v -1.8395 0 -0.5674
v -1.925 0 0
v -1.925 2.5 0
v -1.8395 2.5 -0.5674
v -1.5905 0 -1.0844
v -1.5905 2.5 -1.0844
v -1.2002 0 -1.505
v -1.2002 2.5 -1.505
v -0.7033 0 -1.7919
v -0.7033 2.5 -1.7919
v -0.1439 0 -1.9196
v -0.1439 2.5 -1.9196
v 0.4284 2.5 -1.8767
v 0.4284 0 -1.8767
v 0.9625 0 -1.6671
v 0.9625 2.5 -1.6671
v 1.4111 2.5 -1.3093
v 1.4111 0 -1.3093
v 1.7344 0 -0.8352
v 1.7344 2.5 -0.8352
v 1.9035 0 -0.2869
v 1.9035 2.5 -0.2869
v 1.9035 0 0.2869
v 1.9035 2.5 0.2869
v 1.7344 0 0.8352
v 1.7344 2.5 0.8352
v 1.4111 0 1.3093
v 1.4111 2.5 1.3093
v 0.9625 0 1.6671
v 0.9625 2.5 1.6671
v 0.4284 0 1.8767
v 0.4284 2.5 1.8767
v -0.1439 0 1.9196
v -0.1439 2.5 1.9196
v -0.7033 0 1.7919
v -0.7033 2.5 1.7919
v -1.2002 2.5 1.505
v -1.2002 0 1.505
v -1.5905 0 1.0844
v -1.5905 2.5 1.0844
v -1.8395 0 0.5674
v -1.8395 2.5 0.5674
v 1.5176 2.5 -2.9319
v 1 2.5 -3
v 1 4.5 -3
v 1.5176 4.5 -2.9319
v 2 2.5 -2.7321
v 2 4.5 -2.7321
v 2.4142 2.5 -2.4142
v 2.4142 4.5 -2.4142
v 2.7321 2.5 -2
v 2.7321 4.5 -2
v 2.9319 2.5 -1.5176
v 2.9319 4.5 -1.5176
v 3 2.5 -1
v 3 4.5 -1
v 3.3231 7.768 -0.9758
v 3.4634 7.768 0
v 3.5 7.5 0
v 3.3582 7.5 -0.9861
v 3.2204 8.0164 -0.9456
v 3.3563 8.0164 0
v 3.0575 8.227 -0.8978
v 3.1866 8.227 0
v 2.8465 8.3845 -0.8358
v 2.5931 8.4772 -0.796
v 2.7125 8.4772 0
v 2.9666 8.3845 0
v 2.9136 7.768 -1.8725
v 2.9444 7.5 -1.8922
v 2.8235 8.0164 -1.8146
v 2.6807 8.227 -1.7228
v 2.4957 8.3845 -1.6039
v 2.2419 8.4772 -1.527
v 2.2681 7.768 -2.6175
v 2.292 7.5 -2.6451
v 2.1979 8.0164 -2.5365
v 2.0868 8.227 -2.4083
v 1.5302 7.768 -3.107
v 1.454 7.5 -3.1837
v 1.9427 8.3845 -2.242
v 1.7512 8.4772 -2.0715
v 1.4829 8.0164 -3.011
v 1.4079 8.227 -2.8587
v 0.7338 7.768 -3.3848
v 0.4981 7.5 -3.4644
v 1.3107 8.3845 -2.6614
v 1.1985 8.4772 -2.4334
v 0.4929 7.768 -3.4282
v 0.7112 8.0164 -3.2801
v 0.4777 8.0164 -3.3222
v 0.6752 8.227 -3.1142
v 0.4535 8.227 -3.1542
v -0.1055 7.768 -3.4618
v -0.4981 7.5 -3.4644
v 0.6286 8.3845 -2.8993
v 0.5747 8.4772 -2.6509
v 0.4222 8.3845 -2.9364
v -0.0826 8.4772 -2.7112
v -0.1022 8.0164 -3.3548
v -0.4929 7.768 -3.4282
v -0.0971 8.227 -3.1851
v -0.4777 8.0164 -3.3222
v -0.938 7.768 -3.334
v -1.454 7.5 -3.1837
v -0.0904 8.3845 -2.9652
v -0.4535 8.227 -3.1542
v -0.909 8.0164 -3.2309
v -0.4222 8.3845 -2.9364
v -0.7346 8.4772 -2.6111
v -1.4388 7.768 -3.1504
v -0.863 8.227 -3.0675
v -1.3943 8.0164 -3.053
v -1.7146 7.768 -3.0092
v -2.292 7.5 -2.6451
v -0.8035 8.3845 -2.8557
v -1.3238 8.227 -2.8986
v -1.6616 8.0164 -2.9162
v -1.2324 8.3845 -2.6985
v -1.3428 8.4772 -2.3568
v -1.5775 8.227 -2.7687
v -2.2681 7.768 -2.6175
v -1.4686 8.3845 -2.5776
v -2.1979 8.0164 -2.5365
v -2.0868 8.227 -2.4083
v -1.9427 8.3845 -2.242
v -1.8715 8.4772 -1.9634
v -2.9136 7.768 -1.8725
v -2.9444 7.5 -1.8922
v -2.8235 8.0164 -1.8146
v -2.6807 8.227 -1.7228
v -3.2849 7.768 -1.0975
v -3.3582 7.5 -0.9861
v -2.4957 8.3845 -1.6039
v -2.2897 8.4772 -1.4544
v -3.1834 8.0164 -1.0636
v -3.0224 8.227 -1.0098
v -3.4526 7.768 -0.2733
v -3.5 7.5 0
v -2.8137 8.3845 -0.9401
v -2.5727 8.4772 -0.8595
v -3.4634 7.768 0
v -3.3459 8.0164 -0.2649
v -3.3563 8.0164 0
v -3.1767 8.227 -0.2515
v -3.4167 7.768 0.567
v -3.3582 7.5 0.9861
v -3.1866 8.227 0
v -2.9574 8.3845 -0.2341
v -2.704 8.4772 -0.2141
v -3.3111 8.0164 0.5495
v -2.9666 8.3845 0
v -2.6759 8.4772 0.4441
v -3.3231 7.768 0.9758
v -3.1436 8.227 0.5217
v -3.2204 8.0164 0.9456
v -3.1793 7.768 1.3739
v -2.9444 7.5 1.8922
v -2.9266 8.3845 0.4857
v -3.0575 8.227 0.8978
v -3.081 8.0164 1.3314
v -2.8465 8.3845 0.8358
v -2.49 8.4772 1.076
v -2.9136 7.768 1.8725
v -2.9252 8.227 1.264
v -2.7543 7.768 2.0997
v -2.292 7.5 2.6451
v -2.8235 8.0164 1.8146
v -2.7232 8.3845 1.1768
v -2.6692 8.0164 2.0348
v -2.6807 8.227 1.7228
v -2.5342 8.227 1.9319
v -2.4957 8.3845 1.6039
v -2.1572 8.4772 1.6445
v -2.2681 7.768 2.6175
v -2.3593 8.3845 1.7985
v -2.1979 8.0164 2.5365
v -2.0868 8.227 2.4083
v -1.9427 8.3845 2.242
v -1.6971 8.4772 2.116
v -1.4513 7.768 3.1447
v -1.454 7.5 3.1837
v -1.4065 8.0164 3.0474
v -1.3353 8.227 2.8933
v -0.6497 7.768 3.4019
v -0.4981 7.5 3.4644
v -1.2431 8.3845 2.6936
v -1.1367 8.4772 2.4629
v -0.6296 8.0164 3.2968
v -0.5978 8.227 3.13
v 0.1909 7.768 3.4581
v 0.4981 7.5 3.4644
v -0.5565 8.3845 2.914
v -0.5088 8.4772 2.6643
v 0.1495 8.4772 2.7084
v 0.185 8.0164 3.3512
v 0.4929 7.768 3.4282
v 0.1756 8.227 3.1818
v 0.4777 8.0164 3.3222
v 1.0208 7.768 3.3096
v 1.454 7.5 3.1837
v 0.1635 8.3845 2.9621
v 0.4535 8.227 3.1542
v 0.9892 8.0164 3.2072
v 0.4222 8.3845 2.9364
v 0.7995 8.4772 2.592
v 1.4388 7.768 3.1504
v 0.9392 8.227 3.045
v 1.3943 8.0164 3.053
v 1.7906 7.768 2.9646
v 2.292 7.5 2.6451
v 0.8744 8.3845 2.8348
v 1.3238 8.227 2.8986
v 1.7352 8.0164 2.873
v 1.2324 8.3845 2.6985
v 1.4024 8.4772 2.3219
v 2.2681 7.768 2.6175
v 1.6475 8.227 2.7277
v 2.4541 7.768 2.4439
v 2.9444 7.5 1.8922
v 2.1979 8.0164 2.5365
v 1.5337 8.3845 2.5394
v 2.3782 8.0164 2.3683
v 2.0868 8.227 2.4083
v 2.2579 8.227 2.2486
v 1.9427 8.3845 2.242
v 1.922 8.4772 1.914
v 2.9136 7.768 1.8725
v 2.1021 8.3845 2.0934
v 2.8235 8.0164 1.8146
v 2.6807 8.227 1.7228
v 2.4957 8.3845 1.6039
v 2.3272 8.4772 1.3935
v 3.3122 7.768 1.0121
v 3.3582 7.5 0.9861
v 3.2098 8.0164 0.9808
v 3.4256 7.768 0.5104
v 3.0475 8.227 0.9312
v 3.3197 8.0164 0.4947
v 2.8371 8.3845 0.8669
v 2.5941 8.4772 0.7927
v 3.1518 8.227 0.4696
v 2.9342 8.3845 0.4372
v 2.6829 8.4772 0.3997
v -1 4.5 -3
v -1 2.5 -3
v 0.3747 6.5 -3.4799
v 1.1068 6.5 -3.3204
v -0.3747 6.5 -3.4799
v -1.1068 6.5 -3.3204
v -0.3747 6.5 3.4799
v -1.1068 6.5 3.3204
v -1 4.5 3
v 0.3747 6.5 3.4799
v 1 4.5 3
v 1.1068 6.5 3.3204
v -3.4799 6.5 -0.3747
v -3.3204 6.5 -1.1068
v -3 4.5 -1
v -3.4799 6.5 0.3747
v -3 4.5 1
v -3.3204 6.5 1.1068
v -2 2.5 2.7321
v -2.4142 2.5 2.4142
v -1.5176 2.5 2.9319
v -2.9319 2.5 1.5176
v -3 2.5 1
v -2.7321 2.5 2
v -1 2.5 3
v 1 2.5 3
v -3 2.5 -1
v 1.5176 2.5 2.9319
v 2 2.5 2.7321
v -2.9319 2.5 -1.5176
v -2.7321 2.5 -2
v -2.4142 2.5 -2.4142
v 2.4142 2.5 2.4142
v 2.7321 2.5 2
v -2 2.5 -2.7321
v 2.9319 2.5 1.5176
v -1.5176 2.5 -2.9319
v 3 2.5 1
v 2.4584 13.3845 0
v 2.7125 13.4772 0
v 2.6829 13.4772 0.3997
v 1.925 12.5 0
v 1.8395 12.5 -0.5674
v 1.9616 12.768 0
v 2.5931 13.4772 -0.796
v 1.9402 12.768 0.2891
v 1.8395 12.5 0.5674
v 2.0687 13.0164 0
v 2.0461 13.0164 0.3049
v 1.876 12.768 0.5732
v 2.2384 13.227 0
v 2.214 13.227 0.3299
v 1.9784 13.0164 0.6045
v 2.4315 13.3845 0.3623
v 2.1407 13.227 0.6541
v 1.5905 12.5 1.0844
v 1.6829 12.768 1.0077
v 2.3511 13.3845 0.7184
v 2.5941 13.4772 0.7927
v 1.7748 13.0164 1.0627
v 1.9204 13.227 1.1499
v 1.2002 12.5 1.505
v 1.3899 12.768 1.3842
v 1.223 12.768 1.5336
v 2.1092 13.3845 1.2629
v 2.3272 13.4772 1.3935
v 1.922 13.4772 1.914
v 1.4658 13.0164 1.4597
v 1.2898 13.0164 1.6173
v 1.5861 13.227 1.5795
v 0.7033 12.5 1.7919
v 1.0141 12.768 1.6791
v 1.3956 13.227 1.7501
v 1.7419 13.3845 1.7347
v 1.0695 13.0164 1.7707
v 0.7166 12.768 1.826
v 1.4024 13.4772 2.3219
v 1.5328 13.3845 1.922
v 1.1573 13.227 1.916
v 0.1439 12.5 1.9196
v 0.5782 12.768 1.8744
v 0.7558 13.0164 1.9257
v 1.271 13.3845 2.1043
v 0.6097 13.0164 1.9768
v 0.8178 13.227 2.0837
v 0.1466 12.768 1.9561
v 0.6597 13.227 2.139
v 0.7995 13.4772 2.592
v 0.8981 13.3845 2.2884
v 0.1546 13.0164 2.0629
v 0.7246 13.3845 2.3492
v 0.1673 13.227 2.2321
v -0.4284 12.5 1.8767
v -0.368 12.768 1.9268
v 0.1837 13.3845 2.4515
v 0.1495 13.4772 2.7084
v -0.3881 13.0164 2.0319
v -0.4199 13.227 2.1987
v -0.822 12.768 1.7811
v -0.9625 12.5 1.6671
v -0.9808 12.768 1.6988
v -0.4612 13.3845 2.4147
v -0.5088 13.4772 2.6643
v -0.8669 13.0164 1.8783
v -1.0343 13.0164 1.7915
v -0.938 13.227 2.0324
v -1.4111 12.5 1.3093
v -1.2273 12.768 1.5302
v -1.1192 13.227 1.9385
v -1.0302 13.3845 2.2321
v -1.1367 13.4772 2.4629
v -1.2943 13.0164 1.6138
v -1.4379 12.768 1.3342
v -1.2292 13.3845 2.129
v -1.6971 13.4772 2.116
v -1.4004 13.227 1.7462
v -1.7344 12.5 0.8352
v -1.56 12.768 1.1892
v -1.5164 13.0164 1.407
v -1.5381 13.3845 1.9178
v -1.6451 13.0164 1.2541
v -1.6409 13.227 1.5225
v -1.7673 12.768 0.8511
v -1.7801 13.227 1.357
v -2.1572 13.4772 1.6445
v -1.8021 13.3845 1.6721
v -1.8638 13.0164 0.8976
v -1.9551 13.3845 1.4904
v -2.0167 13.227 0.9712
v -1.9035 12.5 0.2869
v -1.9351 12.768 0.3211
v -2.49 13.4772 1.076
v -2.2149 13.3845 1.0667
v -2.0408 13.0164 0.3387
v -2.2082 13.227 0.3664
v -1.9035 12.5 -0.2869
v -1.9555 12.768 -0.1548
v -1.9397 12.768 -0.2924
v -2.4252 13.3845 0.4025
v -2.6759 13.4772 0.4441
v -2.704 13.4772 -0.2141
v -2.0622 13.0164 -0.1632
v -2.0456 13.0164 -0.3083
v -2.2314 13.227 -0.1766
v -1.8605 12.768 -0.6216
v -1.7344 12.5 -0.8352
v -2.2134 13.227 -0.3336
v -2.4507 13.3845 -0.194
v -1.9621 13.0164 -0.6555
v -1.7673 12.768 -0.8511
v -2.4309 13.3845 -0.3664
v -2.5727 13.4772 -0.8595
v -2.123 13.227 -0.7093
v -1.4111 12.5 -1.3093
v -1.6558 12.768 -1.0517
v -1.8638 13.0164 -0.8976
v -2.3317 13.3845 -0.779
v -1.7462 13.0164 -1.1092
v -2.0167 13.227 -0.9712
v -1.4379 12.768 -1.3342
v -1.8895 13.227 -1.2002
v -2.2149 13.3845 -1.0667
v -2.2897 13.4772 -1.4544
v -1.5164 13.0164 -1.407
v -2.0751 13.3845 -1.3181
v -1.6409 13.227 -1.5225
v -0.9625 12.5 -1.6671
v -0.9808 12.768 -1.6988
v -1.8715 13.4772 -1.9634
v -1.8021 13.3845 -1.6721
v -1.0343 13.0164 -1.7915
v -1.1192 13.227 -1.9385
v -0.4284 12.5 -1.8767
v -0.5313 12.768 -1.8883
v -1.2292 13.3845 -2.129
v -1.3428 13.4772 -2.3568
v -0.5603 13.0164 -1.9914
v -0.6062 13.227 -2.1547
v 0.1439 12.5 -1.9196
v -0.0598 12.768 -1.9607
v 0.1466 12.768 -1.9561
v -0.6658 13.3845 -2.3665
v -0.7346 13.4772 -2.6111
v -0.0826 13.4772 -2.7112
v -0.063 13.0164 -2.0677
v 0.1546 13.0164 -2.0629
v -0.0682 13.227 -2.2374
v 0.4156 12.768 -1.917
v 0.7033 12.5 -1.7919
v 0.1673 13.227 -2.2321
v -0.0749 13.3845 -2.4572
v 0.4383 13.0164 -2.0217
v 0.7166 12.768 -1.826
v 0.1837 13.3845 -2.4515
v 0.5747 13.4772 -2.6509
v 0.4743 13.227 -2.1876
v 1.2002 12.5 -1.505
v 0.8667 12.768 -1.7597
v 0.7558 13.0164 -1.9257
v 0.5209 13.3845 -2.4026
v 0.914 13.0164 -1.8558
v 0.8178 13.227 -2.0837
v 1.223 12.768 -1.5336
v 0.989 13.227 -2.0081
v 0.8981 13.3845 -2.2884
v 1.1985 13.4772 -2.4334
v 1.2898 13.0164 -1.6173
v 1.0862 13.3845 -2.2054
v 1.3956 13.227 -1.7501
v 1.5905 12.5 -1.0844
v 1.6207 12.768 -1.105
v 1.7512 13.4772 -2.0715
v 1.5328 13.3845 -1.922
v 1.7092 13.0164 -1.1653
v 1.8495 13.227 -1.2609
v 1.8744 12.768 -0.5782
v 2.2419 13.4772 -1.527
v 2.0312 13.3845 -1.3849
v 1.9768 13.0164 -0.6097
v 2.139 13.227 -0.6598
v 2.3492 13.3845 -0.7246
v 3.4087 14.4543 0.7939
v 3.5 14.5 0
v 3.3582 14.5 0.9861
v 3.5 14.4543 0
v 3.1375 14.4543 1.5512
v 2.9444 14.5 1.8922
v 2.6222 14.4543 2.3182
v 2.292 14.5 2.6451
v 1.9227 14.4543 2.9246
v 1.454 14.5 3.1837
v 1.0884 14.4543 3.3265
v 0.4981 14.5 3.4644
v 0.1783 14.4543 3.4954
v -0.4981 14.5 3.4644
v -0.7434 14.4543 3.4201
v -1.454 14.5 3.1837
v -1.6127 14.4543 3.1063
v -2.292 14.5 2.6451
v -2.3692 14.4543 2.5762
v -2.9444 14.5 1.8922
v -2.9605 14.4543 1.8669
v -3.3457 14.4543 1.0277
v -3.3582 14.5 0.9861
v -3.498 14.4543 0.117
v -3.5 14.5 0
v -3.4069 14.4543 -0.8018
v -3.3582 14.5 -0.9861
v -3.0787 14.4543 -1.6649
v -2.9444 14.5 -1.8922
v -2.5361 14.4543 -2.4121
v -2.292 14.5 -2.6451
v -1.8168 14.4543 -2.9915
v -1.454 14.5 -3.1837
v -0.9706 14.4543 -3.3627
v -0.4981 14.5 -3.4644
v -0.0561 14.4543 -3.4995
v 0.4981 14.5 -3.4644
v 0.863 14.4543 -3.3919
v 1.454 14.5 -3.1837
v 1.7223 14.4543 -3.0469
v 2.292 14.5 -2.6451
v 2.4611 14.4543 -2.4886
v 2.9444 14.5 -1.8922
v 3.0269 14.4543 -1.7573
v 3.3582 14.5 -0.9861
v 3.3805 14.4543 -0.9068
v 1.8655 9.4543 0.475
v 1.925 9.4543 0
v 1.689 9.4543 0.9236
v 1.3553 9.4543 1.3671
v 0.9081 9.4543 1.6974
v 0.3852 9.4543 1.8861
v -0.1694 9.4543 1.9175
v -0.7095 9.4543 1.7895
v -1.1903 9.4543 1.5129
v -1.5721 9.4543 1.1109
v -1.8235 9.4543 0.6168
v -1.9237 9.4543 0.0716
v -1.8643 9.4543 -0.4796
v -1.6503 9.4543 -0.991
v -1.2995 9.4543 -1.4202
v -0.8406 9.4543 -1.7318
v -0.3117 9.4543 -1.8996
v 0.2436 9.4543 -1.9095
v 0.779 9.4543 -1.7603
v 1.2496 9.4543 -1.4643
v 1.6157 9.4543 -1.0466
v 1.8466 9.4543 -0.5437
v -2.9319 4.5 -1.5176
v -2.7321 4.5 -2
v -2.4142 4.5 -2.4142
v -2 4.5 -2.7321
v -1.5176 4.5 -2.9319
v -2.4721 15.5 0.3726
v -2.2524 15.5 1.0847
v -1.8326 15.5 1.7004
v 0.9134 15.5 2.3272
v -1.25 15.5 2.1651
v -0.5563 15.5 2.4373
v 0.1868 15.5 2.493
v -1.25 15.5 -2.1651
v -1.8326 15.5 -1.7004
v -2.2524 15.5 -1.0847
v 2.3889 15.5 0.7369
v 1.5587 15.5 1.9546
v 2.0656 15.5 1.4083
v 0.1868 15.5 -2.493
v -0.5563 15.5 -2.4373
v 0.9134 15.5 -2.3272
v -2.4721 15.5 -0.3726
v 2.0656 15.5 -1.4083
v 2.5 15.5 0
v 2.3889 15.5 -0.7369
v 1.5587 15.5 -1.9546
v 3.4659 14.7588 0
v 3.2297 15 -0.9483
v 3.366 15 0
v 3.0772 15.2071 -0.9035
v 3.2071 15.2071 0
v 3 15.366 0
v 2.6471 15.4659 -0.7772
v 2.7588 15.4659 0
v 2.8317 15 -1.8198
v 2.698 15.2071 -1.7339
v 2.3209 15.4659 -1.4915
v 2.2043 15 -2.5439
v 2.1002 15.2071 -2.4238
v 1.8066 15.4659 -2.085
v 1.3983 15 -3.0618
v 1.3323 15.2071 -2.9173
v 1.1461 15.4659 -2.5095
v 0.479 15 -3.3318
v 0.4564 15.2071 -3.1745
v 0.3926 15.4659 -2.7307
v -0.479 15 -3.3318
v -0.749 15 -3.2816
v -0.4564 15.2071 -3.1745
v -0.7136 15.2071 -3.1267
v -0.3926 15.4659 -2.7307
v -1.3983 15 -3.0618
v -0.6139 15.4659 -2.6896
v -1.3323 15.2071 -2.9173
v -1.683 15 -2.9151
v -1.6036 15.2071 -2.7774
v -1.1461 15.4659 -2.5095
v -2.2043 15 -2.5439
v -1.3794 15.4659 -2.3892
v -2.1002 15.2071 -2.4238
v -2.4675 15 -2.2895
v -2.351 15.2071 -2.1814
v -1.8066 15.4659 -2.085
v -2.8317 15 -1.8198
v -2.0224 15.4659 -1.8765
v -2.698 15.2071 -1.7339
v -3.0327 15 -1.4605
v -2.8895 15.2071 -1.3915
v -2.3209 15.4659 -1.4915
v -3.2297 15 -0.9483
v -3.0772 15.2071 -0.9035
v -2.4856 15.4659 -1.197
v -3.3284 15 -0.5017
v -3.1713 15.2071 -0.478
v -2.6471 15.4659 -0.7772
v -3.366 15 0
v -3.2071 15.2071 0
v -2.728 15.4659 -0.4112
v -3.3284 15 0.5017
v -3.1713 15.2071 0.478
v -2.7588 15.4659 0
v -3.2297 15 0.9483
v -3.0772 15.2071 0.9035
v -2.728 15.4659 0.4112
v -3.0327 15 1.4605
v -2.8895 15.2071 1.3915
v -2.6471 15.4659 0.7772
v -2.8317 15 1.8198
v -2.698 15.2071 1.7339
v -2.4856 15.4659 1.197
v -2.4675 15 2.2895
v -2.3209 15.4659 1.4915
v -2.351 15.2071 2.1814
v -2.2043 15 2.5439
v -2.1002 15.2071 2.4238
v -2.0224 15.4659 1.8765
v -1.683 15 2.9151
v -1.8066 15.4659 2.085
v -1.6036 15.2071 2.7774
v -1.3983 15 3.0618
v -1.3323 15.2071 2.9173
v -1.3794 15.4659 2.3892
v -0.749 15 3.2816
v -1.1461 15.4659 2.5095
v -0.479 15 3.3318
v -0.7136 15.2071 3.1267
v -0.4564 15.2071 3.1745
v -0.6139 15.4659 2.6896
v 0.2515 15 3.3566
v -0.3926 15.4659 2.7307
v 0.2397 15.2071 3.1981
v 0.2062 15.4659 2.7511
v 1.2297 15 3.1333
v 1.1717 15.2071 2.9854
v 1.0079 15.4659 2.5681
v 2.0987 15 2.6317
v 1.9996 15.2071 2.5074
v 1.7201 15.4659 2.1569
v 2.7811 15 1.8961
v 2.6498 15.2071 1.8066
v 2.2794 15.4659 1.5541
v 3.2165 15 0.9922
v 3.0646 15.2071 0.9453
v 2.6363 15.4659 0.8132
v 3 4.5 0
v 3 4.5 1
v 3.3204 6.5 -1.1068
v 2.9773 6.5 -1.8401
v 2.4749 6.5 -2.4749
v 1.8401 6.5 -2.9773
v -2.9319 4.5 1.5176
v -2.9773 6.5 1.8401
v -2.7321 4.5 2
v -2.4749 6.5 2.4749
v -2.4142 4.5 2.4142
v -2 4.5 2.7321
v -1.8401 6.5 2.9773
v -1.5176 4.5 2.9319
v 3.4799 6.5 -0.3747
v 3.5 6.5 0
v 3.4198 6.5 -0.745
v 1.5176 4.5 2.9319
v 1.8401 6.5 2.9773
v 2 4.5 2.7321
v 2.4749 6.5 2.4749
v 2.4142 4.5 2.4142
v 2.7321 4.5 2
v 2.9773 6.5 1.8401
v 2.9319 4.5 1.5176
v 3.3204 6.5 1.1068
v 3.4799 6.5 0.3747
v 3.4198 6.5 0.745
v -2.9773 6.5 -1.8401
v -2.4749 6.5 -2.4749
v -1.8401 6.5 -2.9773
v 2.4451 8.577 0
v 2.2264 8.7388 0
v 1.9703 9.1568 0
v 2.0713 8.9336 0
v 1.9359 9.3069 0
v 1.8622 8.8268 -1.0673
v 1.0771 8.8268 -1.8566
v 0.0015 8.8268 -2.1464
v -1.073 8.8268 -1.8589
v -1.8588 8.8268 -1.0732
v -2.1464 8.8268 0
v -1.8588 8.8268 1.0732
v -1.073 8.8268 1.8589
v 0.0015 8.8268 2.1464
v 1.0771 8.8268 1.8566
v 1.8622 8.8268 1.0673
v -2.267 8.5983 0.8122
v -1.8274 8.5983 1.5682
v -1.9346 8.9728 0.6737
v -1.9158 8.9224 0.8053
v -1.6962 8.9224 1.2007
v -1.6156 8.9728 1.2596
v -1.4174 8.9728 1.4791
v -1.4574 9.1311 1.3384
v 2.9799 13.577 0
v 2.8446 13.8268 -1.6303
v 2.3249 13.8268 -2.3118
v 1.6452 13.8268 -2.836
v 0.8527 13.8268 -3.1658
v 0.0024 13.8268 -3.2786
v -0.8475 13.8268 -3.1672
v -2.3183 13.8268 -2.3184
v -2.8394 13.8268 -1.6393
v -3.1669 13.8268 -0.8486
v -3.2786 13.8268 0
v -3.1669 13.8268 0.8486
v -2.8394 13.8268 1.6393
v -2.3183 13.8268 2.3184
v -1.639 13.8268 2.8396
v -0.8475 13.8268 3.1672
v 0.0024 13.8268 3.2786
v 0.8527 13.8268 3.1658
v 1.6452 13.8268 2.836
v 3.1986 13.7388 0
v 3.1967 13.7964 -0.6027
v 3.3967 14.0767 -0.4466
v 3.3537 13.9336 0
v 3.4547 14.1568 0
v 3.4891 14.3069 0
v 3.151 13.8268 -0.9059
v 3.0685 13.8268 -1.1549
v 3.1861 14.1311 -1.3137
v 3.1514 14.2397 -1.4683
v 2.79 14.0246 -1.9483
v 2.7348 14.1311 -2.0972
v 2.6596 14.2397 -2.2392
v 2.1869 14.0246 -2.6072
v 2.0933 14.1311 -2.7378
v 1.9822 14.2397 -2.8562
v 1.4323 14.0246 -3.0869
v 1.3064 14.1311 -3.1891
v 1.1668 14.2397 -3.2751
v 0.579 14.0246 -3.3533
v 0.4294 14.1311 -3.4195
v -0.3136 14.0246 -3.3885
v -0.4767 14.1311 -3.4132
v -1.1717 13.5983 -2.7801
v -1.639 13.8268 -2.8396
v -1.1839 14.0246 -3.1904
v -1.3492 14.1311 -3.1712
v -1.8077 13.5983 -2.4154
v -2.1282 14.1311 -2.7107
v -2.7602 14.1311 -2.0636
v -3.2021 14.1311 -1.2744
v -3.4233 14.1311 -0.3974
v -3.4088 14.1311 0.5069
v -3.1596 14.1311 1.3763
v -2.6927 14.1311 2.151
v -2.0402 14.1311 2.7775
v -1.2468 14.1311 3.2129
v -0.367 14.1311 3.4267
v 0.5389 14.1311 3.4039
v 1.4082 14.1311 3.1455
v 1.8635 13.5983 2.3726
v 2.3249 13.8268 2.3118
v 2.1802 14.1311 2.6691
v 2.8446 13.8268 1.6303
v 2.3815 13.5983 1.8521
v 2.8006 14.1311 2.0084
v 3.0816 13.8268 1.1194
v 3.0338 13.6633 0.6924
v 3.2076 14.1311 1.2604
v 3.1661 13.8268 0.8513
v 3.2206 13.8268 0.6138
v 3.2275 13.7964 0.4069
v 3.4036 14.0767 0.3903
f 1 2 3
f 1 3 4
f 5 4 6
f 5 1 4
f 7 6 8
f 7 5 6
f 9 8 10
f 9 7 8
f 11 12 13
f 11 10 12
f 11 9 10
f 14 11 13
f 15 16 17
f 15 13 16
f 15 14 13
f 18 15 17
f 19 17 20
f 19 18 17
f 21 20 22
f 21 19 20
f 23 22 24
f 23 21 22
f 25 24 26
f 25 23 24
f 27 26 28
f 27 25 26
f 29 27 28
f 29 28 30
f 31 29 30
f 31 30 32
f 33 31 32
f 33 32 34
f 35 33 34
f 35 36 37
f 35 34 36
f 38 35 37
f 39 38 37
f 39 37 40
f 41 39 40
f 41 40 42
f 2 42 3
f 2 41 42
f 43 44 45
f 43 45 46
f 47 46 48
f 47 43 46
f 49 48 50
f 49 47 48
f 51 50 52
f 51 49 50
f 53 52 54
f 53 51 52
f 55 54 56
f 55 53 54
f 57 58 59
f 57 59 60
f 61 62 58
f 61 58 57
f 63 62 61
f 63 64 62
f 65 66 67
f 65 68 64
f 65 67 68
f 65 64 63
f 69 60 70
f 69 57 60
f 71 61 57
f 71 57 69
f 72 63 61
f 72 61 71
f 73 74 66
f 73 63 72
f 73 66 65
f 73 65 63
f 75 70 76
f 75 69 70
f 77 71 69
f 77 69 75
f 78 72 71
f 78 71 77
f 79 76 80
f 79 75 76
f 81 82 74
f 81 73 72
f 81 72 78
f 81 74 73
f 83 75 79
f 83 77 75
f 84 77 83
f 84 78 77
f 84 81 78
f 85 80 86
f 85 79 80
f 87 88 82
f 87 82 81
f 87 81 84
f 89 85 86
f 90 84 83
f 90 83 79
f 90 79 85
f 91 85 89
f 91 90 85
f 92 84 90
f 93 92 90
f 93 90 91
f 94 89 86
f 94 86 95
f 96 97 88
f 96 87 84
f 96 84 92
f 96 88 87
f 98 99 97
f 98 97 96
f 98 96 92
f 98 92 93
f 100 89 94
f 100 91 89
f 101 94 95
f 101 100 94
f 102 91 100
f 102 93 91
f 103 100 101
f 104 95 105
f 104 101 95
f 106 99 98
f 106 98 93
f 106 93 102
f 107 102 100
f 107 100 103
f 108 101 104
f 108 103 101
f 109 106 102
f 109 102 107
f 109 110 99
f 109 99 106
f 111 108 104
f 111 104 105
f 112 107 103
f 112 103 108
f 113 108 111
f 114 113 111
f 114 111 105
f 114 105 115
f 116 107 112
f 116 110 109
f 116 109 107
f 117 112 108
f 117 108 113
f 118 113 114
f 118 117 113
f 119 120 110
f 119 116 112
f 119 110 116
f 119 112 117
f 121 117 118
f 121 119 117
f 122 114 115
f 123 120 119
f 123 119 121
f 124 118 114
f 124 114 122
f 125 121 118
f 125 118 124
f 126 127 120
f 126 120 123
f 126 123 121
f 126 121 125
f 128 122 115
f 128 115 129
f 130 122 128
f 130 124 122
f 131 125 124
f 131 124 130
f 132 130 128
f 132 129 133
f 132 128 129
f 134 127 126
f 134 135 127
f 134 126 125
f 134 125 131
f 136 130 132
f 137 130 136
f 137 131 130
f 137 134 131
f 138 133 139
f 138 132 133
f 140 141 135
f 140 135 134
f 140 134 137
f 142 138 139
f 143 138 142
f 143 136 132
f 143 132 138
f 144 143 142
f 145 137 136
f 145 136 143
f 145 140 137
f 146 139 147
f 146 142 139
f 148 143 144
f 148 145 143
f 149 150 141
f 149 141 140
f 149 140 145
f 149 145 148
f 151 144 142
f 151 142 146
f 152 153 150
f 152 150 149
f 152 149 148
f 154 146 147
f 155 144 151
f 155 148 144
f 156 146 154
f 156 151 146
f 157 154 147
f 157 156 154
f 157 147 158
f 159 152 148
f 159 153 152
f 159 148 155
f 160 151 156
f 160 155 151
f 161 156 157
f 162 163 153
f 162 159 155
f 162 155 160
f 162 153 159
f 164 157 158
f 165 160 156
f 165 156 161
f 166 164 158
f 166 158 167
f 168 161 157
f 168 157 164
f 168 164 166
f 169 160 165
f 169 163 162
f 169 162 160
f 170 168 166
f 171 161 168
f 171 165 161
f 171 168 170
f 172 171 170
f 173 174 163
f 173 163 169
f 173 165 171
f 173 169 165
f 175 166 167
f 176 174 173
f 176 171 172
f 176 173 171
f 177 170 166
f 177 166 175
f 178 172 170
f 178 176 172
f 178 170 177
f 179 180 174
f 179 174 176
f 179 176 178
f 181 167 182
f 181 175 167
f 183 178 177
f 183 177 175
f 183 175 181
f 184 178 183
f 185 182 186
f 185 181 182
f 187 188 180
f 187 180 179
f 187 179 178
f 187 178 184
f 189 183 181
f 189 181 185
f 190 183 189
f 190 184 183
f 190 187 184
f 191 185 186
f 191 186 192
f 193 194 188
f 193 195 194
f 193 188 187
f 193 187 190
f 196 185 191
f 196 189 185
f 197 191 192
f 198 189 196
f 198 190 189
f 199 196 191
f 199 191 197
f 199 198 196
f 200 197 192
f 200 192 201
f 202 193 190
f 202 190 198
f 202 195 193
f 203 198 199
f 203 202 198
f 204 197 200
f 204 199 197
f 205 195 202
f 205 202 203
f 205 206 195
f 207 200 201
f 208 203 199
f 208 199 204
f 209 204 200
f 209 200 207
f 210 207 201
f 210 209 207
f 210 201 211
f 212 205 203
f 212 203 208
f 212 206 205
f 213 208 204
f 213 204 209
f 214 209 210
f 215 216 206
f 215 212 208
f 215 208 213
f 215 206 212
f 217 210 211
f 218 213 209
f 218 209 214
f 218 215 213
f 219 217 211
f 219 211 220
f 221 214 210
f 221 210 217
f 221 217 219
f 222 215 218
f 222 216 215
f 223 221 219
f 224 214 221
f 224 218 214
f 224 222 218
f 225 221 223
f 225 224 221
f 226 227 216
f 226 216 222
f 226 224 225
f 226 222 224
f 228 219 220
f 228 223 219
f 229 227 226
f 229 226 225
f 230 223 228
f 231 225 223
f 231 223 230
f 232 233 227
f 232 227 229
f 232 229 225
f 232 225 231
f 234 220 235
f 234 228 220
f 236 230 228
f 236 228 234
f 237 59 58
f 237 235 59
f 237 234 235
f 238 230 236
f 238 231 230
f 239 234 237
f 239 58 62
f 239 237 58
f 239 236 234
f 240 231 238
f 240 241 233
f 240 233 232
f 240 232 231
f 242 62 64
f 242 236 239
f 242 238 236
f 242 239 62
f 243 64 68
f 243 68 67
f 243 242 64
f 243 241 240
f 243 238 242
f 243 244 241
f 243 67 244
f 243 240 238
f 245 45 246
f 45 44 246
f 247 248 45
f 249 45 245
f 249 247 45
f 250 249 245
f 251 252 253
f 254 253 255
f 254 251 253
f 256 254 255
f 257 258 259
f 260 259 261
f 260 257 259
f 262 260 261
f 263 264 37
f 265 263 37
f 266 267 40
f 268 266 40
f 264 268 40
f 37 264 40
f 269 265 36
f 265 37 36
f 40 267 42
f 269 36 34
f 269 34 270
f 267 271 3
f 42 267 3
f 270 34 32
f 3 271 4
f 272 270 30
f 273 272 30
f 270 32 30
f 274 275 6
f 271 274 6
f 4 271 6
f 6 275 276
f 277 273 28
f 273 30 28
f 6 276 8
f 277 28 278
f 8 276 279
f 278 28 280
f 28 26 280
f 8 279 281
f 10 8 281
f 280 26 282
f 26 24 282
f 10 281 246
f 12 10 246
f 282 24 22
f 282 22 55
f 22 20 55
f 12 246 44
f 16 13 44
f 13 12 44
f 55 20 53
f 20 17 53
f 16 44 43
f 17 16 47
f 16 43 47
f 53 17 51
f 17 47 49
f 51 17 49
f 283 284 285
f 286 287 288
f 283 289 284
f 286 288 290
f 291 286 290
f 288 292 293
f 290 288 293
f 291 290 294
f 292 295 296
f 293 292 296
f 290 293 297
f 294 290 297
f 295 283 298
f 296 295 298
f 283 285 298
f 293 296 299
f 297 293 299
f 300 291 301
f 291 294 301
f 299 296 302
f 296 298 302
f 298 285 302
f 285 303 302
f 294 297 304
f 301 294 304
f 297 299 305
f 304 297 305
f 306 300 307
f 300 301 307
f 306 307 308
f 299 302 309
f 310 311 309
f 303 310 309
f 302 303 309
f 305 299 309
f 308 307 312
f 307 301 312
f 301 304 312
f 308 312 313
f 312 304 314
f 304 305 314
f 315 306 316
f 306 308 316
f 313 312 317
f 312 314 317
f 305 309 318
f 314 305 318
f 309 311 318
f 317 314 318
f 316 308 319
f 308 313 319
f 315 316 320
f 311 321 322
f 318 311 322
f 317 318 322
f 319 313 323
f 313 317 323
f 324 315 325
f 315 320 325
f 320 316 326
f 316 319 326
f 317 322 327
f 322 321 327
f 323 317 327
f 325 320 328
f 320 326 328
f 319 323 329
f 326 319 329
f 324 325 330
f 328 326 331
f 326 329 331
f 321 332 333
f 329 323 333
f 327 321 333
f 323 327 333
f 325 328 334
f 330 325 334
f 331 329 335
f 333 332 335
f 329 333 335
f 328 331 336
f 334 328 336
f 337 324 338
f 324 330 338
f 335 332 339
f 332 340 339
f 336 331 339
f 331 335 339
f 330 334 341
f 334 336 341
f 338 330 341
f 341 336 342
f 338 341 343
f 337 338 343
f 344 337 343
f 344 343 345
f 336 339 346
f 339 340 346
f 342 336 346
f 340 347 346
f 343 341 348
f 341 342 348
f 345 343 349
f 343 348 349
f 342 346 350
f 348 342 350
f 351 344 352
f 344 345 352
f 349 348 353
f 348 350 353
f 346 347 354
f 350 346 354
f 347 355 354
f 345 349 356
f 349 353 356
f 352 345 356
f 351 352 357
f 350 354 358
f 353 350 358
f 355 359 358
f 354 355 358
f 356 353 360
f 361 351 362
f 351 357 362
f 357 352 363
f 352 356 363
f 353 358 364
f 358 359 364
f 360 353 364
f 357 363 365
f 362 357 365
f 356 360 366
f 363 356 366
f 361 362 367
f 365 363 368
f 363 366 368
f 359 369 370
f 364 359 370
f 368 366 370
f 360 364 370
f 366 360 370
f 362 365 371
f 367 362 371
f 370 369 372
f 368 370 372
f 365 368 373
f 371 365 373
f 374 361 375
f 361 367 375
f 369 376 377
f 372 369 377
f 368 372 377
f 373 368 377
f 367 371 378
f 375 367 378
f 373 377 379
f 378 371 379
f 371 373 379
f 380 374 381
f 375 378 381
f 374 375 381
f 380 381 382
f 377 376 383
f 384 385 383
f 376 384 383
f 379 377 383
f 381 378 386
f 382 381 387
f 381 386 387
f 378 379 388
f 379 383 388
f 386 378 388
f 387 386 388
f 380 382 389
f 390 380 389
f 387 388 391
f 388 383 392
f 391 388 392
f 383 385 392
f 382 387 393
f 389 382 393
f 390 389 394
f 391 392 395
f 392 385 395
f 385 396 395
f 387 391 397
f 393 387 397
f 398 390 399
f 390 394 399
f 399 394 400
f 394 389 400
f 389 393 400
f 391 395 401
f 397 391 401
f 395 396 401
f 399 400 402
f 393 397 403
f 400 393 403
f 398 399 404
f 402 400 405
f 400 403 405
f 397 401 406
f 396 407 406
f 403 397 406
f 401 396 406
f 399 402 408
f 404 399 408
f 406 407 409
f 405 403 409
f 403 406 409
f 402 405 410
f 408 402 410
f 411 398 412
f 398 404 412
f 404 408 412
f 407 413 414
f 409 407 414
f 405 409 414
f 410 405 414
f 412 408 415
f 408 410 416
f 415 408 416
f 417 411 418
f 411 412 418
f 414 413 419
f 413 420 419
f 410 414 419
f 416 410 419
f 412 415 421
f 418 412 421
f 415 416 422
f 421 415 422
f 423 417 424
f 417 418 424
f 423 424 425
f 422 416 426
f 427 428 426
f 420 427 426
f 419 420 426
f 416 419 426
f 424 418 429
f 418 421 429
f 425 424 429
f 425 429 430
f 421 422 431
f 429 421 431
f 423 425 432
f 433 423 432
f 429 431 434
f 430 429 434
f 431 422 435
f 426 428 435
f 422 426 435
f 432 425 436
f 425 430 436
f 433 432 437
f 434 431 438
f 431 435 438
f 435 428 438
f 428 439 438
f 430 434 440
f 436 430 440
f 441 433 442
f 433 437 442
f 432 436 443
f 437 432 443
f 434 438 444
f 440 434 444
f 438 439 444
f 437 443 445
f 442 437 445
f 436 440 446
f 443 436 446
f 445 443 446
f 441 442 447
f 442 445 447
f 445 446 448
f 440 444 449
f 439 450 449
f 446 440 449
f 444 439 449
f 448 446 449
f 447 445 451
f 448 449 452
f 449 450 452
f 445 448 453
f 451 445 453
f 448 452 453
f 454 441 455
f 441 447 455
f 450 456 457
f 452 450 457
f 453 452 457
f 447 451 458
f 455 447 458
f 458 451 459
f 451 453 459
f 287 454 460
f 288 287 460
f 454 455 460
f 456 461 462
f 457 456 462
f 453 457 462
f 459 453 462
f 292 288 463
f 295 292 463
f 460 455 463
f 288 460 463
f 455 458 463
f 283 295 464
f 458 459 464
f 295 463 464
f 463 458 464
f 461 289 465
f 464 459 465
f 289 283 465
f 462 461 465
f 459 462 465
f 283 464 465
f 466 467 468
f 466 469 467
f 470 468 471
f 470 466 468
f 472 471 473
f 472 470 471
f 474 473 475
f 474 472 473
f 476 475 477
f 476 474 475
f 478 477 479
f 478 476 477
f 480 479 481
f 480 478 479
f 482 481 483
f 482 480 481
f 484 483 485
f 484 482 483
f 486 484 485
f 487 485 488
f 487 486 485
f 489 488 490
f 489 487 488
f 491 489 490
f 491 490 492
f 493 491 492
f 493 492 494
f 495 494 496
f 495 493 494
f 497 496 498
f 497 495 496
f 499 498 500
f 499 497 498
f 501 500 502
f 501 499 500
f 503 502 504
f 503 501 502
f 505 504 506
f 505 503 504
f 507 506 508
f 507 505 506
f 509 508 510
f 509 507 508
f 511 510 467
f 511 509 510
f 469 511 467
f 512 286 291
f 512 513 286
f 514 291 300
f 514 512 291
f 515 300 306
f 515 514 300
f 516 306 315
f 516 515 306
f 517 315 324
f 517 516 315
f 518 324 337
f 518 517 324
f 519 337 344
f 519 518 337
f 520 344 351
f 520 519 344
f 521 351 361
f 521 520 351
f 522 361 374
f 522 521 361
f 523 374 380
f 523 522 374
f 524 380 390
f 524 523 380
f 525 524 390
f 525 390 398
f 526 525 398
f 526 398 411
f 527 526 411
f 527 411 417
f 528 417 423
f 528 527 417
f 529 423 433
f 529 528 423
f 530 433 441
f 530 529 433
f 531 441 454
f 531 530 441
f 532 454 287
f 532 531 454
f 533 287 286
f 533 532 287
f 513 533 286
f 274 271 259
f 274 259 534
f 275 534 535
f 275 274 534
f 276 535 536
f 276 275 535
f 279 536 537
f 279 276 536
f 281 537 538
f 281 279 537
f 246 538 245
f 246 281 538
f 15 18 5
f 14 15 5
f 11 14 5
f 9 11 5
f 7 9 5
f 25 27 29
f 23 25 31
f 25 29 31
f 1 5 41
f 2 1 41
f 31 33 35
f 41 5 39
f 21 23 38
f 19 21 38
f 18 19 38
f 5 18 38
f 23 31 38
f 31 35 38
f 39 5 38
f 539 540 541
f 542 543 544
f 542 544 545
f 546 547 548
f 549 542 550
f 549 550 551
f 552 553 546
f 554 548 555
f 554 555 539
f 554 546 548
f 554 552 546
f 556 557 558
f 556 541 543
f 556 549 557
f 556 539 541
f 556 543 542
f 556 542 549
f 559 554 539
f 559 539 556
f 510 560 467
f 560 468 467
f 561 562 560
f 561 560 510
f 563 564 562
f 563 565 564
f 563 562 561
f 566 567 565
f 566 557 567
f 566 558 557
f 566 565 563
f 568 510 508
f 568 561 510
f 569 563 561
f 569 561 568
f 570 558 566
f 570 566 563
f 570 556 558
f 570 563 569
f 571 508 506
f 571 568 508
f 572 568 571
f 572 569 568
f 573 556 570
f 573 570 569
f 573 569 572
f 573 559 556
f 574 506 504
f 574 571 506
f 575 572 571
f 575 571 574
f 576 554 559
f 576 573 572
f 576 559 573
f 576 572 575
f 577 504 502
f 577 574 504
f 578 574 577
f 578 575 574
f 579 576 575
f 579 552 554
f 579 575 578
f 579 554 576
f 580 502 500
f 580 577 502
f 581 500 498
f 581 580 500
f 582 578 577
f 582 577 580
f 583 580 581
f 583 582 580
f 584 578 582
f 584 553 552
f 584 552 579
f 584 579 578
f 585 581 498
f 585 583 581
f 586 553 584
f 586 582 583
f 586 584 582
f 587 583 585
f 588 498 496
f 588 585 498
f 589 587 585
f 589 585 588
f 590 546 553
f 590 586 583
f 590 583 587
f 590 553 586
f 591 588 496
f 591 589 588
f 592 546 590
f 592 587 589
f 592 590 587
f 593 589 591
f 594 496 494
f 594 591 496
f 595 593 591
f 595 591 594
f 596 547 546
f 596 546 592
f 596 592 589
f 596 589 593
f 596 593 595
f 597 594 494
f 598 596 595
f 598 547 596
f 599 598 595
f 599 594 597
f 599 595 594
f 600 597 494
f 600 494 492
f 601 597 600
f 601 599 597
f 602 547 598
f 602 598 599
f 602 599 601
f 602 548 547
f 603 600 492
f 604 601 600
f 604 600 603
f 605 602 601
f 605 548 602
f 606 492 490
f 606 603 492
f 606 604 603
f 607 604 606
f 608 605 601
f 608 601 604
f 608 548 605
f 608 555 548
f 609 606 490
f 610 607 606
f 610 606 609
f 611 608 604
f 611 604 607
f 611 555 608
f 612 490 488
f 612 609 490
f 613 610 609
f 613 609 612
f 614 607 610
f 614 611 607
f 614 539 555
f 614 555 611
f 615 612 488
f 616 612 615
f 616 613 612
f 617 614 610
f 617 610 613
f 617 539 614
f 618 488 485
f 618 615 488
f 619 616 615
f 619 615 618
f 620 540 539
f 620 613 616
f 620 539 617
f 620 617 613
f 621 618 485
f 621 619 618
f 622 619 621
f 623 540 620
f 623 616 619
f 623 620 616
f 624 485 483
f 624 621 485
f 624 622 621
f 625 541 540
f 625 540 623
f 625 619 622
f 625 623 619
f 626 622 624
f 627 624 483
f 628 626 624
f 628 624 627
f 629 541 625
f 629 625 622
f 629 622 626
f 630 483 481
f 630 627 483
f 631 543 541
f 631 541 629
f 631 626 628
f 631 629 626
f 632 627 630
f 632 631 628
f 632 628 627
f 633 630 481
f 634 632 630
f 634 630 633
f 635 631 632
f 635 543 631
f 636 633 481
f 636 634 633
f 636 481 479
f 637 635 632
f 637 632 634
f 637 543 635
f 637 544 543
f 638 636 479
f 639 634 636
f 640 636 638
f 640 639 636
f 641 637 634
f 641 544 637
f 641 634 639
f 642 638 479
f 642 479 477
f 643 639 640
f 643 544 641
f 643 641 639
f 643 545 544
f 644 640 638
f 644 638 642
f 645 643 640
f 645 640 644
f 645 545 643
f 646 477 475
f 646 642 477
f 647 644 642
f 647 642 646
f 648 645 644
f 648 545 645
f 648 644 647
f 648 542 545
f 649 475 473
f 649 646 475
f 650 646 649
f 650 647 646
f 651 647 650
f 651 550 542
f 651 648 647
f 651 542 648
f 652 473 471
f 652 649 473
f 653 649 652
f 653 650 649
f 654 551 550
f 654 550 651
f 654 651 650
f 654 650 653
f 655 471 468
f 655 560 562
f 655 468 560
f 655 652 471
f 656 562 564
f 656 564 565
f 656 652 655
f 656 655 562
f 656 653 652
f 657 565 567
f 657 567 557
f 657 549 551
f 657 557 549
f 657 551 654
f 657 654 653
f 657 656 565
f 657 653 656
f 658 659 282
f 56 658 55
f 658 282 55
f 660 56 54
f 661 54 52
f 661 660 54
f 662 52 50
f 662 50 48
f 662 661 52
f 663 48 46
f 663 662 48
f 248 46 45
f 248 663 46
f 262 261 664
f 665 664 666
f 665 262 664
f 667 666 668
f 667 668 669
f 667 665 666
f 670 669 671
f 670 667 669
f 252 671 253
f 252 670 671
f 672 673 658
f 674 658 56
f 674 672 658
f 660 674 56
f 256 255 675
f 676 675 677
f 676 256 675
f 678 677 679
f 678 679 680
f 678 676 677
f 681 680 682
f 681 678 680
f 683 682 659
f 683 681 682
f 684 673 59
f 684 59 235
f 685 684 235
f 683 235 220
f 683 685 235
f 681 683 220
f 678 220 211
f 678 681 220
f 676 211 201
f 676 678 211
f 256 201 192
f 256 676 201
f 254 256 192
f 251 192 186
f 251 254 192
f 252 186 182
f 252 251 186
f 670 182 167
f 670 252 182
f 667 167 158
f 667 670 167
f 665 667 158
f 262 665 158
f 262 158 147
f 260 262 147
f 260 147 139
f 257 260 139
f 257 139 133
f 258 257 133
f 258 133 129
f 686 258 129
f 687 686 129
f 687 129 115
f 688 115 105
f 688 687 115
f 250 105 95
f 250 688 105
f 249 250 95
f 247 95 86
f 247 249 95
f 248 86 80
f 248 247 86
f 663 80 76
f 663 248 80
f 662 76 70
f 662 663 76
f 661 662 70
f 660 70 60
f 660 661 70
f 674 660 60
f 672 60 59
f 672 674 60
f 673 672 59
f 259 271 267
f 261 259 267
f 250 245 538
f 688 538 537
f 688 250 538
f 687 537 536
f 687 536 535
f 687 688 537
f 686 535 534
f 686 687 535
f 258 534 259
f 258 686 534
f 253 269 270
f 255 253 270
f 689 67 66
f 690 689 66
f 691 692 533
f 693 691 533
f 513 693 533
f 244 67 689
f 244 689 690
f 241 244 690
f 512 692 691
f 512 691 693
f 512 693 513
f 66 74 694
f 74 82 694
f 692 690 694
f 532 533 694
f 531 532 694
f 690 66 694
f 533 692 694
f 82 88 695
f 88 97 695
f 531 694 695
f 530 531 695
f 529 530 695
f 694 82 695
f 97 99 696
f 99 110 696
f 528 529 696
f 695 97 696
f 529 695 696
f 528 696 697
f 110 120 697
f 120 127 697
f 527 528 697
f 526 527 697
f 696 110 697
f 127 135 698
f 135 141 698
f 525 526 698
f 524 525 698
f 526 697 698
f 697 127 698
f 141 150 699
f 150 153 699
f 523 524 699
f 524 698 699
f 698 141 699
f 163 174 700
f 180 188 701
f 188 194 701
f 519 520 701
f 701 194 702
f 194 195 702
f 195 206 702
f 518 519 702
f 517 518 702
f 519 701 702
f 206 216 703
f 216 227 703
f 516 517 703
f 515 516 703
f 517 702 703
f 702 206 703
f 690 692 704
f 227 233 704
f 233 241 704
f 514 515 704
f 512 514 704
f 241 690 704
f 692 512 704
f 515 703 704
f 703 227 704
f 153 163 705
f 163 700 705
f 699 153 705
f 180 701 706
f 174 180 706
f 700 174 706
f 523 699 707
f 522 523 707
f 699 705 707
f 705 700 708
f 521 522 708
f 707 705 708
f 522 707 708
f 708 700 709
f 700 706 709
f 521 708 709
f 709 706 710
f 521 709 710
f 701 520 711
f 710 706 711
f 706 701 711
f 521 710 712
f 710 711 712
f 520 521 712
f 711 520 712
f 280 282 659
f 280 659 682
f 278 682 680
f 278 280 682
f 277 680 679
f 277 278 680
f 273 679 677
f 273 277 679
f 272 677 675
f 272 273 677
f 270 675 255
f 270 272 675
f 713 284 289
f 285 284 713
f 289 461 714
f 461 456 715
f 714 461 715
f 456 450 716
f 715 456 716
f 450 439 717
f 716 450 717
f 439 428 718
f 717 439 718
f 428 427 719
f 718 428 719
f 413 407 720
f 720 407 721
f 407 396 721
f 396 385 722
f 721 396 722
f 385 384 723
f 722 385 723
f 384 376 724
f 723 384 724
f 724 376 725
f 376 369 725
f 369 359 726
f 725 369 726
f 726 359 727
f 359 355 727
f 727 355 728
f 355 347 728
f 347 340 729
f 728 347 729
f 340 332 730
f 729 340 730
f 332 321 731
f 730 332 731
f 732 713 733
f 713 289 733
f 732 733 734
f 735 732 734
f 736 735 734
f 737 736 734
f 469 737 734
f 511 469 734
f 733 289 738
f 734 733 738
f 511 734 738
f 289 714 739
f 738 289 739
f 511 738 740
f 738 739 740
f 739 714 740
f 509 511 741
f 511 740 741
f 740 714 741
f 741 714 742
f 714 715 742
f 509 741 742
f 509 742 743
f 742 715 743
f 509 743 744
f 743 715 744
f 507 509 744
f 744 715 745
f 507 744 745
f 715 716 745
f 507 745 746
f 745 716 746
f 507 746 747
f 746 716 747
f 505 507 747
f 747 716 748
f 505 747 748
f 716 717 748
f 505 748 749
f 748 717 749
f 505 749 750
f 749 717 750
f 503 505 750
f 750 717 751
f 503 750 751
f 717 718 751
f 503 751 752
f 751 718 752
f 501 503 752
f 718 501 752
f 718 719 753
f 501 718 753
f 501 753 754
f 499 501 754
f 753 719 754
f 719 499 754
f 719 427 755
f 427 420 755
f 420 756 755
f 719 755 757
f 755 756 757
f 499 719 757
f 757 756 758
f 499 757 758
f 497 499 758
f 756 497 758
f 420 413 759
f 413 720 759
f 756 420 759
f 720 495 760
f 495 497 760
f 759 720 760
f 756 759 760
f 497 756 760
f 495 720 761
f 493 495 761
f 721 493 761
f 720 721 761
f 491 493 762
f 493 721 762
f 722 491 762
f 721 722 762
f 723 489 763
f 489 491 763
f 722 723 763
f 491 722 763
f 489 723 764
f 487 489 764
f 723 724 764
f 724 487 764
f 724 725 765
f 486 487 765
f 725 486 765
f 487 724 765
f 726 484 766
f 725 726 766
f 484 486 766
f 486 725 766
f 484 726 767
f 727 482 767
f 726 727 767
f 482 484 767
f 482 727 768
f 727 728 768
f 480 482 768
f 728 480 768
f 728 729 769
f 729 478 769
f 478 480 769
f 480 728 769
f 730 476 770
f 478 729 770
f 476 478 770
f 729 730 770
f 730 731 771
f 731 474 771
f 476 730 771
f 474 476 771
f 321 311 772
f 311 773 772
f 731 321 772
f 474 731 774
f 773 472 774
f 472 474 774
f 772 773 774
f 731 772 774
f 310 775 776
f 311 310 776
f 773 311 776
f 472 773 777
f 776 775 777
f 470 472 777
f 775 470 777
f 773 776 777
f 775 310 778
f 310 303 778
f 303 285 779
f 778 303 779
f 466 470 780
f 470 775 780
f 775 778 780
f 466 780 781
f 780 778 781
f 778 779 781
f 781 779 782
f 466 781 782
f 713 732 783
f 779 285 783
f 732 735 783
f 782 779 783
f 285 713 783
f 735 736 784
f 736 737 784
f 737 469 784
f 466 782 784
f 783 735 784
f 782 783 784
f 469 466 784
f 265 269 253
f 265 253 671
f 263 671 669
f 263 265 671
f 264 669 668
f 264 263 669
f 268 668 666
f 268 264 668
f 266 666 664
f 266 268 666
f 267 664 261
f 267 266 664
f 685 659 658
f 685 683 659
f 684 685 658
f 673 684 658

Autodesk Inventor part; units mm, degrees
ref_plane "YZ Plane" through (0, 0, 0) normal (1, 0, 0) x (0, 1, 0)
ref_plane "XZ Plane" through (0, 0, 0) normal (0, 1, 0) x (-1, 0, 0)
ref_plane "XY Plane" through (0, 0, 0) normal (0, 0, 1) x (1, 0, 0)
sketch "Sketch1" plane through (0, 0, 0) normal (0, 1, 0) x (-1, 0, 0)
  circle A0 centre (0, 0) radius 1.925
  dimension "d0" = 3.85
extrude "Extrusion1" add sketch "Sketch1" along normal blind 2.5
sketch "Sketch2" plane through (0, 2.5, 0) normal (0, 1, 0) x (1, 0, 0)
  line L0 (-1, -3) -> (1, -3)
  line L1 (3, -1) -> (3, 1)
  line L2 (1, 3) -> (-1, 3)
  line L3 (-3, 1) -> (-3, -1)
  line L4 (-3, -3) -> (3, 3) construction
  line L5 (3, -3) -> (-3, 3) construction
  arc A0 (-3, -1) -> (-1, -3) centre (-1, -1) ccw
  arc A1 (-1, 3) -> (-3, 1) centre (-1, 1) ccw
  arc A2 (3, 1) -> (1, 3) centre (1, 1) ccw
  arc A3 (1, -3) -> (3, -1) centre (1, -1) ccw
  point P0 (0, 0)
  dimension "d3" = 6
  dimension "d4" = 6
  dimension "d5" = 2
extrude "Extrusion2" add sketch "Sketch2" along normal blind 2
sketch "Sketch3" plane through (0, 4.5, 0) normal (0, 1, 0) x (1, 0, 0)
  circle A0 centre (0, 0) radius 1.925 projected
extrude "Extrusion3" add sketch "Sketch3" along normal blind 2
sketch "Sketch5" plane through (0, 6.5, 0) normal (0, 1, 0) x (1, 0, 0)
  circle A0 centre (0, 0) radius 3.5
  dimension "d14" = 7
extrude "Extrusion5" add sketch "Sketch5" along normal blind 2
sketch "Sketch6" plane through (0, 8.5, 0) normal (0, 1, 0) x (1, 0, 0)
  circle A0 centre (0, 0) radius 1.925 projected
extrude "Extrusion6" add sketch "Sketch6" along normal blind 5
sketch "Sketch7" plane through (0, 13.5, 0) normal (0, 1, 0) x (1, 0, 0)
  circle A0 centre (0, 0) radius 3.5 projected
extrude "Extrusion7" add sketch "Sketch7" along normal blind 2
sketch "Sketch8" plane through (0, 4.5, 0) normal (0, 1, 0) x (1, 0, 0)
  circle A0 centre (0, 0) radius 1.925 projected
  arc A1 (1, -3) -> (3, -1) centre (1, -1) ccw projected
  line L0 (3, -1) -> (3, 1) projected
  arc A2 (3, 1) -> (1, 3) centre (1, 1) ccw projected
  line L1 (1, 3) -> (-1, 3) projected
  arc A3 (-1, 3) -> (-3, 1) centre (-1, 1) ccw projected
  line L2 (-3, 1) -> (-3, -1) projected
  arc A4 (-3, -1) -> (-1, -3) centre (-1, -1) ccw projected
  line L3 (-1, -3) -> (1, -3) projected
loft "Loft1" add section 1 edges at (2.4142, 4.5, 2.4142) (3, 4.5, 0) (2.4142, 4.5, -2.4142) (0, 4.5, -3) (-2.4142, 4.5, -2.4142) (-3, 4.5, 0) (-2.4142, 4.5, 2.4142) (0, 4.5, 3) section 2 edges at (-3.5, 6.5, 0)
fillet "Fillet3" radius 1 5 edges at (-3.5, 8.5, 0) (-1.925, 8.5, 0) (-1.925, 13.5, 0) (-3.5, 13.5, 0) (-3.5, 15.5, 0)
properties part number "guia"
